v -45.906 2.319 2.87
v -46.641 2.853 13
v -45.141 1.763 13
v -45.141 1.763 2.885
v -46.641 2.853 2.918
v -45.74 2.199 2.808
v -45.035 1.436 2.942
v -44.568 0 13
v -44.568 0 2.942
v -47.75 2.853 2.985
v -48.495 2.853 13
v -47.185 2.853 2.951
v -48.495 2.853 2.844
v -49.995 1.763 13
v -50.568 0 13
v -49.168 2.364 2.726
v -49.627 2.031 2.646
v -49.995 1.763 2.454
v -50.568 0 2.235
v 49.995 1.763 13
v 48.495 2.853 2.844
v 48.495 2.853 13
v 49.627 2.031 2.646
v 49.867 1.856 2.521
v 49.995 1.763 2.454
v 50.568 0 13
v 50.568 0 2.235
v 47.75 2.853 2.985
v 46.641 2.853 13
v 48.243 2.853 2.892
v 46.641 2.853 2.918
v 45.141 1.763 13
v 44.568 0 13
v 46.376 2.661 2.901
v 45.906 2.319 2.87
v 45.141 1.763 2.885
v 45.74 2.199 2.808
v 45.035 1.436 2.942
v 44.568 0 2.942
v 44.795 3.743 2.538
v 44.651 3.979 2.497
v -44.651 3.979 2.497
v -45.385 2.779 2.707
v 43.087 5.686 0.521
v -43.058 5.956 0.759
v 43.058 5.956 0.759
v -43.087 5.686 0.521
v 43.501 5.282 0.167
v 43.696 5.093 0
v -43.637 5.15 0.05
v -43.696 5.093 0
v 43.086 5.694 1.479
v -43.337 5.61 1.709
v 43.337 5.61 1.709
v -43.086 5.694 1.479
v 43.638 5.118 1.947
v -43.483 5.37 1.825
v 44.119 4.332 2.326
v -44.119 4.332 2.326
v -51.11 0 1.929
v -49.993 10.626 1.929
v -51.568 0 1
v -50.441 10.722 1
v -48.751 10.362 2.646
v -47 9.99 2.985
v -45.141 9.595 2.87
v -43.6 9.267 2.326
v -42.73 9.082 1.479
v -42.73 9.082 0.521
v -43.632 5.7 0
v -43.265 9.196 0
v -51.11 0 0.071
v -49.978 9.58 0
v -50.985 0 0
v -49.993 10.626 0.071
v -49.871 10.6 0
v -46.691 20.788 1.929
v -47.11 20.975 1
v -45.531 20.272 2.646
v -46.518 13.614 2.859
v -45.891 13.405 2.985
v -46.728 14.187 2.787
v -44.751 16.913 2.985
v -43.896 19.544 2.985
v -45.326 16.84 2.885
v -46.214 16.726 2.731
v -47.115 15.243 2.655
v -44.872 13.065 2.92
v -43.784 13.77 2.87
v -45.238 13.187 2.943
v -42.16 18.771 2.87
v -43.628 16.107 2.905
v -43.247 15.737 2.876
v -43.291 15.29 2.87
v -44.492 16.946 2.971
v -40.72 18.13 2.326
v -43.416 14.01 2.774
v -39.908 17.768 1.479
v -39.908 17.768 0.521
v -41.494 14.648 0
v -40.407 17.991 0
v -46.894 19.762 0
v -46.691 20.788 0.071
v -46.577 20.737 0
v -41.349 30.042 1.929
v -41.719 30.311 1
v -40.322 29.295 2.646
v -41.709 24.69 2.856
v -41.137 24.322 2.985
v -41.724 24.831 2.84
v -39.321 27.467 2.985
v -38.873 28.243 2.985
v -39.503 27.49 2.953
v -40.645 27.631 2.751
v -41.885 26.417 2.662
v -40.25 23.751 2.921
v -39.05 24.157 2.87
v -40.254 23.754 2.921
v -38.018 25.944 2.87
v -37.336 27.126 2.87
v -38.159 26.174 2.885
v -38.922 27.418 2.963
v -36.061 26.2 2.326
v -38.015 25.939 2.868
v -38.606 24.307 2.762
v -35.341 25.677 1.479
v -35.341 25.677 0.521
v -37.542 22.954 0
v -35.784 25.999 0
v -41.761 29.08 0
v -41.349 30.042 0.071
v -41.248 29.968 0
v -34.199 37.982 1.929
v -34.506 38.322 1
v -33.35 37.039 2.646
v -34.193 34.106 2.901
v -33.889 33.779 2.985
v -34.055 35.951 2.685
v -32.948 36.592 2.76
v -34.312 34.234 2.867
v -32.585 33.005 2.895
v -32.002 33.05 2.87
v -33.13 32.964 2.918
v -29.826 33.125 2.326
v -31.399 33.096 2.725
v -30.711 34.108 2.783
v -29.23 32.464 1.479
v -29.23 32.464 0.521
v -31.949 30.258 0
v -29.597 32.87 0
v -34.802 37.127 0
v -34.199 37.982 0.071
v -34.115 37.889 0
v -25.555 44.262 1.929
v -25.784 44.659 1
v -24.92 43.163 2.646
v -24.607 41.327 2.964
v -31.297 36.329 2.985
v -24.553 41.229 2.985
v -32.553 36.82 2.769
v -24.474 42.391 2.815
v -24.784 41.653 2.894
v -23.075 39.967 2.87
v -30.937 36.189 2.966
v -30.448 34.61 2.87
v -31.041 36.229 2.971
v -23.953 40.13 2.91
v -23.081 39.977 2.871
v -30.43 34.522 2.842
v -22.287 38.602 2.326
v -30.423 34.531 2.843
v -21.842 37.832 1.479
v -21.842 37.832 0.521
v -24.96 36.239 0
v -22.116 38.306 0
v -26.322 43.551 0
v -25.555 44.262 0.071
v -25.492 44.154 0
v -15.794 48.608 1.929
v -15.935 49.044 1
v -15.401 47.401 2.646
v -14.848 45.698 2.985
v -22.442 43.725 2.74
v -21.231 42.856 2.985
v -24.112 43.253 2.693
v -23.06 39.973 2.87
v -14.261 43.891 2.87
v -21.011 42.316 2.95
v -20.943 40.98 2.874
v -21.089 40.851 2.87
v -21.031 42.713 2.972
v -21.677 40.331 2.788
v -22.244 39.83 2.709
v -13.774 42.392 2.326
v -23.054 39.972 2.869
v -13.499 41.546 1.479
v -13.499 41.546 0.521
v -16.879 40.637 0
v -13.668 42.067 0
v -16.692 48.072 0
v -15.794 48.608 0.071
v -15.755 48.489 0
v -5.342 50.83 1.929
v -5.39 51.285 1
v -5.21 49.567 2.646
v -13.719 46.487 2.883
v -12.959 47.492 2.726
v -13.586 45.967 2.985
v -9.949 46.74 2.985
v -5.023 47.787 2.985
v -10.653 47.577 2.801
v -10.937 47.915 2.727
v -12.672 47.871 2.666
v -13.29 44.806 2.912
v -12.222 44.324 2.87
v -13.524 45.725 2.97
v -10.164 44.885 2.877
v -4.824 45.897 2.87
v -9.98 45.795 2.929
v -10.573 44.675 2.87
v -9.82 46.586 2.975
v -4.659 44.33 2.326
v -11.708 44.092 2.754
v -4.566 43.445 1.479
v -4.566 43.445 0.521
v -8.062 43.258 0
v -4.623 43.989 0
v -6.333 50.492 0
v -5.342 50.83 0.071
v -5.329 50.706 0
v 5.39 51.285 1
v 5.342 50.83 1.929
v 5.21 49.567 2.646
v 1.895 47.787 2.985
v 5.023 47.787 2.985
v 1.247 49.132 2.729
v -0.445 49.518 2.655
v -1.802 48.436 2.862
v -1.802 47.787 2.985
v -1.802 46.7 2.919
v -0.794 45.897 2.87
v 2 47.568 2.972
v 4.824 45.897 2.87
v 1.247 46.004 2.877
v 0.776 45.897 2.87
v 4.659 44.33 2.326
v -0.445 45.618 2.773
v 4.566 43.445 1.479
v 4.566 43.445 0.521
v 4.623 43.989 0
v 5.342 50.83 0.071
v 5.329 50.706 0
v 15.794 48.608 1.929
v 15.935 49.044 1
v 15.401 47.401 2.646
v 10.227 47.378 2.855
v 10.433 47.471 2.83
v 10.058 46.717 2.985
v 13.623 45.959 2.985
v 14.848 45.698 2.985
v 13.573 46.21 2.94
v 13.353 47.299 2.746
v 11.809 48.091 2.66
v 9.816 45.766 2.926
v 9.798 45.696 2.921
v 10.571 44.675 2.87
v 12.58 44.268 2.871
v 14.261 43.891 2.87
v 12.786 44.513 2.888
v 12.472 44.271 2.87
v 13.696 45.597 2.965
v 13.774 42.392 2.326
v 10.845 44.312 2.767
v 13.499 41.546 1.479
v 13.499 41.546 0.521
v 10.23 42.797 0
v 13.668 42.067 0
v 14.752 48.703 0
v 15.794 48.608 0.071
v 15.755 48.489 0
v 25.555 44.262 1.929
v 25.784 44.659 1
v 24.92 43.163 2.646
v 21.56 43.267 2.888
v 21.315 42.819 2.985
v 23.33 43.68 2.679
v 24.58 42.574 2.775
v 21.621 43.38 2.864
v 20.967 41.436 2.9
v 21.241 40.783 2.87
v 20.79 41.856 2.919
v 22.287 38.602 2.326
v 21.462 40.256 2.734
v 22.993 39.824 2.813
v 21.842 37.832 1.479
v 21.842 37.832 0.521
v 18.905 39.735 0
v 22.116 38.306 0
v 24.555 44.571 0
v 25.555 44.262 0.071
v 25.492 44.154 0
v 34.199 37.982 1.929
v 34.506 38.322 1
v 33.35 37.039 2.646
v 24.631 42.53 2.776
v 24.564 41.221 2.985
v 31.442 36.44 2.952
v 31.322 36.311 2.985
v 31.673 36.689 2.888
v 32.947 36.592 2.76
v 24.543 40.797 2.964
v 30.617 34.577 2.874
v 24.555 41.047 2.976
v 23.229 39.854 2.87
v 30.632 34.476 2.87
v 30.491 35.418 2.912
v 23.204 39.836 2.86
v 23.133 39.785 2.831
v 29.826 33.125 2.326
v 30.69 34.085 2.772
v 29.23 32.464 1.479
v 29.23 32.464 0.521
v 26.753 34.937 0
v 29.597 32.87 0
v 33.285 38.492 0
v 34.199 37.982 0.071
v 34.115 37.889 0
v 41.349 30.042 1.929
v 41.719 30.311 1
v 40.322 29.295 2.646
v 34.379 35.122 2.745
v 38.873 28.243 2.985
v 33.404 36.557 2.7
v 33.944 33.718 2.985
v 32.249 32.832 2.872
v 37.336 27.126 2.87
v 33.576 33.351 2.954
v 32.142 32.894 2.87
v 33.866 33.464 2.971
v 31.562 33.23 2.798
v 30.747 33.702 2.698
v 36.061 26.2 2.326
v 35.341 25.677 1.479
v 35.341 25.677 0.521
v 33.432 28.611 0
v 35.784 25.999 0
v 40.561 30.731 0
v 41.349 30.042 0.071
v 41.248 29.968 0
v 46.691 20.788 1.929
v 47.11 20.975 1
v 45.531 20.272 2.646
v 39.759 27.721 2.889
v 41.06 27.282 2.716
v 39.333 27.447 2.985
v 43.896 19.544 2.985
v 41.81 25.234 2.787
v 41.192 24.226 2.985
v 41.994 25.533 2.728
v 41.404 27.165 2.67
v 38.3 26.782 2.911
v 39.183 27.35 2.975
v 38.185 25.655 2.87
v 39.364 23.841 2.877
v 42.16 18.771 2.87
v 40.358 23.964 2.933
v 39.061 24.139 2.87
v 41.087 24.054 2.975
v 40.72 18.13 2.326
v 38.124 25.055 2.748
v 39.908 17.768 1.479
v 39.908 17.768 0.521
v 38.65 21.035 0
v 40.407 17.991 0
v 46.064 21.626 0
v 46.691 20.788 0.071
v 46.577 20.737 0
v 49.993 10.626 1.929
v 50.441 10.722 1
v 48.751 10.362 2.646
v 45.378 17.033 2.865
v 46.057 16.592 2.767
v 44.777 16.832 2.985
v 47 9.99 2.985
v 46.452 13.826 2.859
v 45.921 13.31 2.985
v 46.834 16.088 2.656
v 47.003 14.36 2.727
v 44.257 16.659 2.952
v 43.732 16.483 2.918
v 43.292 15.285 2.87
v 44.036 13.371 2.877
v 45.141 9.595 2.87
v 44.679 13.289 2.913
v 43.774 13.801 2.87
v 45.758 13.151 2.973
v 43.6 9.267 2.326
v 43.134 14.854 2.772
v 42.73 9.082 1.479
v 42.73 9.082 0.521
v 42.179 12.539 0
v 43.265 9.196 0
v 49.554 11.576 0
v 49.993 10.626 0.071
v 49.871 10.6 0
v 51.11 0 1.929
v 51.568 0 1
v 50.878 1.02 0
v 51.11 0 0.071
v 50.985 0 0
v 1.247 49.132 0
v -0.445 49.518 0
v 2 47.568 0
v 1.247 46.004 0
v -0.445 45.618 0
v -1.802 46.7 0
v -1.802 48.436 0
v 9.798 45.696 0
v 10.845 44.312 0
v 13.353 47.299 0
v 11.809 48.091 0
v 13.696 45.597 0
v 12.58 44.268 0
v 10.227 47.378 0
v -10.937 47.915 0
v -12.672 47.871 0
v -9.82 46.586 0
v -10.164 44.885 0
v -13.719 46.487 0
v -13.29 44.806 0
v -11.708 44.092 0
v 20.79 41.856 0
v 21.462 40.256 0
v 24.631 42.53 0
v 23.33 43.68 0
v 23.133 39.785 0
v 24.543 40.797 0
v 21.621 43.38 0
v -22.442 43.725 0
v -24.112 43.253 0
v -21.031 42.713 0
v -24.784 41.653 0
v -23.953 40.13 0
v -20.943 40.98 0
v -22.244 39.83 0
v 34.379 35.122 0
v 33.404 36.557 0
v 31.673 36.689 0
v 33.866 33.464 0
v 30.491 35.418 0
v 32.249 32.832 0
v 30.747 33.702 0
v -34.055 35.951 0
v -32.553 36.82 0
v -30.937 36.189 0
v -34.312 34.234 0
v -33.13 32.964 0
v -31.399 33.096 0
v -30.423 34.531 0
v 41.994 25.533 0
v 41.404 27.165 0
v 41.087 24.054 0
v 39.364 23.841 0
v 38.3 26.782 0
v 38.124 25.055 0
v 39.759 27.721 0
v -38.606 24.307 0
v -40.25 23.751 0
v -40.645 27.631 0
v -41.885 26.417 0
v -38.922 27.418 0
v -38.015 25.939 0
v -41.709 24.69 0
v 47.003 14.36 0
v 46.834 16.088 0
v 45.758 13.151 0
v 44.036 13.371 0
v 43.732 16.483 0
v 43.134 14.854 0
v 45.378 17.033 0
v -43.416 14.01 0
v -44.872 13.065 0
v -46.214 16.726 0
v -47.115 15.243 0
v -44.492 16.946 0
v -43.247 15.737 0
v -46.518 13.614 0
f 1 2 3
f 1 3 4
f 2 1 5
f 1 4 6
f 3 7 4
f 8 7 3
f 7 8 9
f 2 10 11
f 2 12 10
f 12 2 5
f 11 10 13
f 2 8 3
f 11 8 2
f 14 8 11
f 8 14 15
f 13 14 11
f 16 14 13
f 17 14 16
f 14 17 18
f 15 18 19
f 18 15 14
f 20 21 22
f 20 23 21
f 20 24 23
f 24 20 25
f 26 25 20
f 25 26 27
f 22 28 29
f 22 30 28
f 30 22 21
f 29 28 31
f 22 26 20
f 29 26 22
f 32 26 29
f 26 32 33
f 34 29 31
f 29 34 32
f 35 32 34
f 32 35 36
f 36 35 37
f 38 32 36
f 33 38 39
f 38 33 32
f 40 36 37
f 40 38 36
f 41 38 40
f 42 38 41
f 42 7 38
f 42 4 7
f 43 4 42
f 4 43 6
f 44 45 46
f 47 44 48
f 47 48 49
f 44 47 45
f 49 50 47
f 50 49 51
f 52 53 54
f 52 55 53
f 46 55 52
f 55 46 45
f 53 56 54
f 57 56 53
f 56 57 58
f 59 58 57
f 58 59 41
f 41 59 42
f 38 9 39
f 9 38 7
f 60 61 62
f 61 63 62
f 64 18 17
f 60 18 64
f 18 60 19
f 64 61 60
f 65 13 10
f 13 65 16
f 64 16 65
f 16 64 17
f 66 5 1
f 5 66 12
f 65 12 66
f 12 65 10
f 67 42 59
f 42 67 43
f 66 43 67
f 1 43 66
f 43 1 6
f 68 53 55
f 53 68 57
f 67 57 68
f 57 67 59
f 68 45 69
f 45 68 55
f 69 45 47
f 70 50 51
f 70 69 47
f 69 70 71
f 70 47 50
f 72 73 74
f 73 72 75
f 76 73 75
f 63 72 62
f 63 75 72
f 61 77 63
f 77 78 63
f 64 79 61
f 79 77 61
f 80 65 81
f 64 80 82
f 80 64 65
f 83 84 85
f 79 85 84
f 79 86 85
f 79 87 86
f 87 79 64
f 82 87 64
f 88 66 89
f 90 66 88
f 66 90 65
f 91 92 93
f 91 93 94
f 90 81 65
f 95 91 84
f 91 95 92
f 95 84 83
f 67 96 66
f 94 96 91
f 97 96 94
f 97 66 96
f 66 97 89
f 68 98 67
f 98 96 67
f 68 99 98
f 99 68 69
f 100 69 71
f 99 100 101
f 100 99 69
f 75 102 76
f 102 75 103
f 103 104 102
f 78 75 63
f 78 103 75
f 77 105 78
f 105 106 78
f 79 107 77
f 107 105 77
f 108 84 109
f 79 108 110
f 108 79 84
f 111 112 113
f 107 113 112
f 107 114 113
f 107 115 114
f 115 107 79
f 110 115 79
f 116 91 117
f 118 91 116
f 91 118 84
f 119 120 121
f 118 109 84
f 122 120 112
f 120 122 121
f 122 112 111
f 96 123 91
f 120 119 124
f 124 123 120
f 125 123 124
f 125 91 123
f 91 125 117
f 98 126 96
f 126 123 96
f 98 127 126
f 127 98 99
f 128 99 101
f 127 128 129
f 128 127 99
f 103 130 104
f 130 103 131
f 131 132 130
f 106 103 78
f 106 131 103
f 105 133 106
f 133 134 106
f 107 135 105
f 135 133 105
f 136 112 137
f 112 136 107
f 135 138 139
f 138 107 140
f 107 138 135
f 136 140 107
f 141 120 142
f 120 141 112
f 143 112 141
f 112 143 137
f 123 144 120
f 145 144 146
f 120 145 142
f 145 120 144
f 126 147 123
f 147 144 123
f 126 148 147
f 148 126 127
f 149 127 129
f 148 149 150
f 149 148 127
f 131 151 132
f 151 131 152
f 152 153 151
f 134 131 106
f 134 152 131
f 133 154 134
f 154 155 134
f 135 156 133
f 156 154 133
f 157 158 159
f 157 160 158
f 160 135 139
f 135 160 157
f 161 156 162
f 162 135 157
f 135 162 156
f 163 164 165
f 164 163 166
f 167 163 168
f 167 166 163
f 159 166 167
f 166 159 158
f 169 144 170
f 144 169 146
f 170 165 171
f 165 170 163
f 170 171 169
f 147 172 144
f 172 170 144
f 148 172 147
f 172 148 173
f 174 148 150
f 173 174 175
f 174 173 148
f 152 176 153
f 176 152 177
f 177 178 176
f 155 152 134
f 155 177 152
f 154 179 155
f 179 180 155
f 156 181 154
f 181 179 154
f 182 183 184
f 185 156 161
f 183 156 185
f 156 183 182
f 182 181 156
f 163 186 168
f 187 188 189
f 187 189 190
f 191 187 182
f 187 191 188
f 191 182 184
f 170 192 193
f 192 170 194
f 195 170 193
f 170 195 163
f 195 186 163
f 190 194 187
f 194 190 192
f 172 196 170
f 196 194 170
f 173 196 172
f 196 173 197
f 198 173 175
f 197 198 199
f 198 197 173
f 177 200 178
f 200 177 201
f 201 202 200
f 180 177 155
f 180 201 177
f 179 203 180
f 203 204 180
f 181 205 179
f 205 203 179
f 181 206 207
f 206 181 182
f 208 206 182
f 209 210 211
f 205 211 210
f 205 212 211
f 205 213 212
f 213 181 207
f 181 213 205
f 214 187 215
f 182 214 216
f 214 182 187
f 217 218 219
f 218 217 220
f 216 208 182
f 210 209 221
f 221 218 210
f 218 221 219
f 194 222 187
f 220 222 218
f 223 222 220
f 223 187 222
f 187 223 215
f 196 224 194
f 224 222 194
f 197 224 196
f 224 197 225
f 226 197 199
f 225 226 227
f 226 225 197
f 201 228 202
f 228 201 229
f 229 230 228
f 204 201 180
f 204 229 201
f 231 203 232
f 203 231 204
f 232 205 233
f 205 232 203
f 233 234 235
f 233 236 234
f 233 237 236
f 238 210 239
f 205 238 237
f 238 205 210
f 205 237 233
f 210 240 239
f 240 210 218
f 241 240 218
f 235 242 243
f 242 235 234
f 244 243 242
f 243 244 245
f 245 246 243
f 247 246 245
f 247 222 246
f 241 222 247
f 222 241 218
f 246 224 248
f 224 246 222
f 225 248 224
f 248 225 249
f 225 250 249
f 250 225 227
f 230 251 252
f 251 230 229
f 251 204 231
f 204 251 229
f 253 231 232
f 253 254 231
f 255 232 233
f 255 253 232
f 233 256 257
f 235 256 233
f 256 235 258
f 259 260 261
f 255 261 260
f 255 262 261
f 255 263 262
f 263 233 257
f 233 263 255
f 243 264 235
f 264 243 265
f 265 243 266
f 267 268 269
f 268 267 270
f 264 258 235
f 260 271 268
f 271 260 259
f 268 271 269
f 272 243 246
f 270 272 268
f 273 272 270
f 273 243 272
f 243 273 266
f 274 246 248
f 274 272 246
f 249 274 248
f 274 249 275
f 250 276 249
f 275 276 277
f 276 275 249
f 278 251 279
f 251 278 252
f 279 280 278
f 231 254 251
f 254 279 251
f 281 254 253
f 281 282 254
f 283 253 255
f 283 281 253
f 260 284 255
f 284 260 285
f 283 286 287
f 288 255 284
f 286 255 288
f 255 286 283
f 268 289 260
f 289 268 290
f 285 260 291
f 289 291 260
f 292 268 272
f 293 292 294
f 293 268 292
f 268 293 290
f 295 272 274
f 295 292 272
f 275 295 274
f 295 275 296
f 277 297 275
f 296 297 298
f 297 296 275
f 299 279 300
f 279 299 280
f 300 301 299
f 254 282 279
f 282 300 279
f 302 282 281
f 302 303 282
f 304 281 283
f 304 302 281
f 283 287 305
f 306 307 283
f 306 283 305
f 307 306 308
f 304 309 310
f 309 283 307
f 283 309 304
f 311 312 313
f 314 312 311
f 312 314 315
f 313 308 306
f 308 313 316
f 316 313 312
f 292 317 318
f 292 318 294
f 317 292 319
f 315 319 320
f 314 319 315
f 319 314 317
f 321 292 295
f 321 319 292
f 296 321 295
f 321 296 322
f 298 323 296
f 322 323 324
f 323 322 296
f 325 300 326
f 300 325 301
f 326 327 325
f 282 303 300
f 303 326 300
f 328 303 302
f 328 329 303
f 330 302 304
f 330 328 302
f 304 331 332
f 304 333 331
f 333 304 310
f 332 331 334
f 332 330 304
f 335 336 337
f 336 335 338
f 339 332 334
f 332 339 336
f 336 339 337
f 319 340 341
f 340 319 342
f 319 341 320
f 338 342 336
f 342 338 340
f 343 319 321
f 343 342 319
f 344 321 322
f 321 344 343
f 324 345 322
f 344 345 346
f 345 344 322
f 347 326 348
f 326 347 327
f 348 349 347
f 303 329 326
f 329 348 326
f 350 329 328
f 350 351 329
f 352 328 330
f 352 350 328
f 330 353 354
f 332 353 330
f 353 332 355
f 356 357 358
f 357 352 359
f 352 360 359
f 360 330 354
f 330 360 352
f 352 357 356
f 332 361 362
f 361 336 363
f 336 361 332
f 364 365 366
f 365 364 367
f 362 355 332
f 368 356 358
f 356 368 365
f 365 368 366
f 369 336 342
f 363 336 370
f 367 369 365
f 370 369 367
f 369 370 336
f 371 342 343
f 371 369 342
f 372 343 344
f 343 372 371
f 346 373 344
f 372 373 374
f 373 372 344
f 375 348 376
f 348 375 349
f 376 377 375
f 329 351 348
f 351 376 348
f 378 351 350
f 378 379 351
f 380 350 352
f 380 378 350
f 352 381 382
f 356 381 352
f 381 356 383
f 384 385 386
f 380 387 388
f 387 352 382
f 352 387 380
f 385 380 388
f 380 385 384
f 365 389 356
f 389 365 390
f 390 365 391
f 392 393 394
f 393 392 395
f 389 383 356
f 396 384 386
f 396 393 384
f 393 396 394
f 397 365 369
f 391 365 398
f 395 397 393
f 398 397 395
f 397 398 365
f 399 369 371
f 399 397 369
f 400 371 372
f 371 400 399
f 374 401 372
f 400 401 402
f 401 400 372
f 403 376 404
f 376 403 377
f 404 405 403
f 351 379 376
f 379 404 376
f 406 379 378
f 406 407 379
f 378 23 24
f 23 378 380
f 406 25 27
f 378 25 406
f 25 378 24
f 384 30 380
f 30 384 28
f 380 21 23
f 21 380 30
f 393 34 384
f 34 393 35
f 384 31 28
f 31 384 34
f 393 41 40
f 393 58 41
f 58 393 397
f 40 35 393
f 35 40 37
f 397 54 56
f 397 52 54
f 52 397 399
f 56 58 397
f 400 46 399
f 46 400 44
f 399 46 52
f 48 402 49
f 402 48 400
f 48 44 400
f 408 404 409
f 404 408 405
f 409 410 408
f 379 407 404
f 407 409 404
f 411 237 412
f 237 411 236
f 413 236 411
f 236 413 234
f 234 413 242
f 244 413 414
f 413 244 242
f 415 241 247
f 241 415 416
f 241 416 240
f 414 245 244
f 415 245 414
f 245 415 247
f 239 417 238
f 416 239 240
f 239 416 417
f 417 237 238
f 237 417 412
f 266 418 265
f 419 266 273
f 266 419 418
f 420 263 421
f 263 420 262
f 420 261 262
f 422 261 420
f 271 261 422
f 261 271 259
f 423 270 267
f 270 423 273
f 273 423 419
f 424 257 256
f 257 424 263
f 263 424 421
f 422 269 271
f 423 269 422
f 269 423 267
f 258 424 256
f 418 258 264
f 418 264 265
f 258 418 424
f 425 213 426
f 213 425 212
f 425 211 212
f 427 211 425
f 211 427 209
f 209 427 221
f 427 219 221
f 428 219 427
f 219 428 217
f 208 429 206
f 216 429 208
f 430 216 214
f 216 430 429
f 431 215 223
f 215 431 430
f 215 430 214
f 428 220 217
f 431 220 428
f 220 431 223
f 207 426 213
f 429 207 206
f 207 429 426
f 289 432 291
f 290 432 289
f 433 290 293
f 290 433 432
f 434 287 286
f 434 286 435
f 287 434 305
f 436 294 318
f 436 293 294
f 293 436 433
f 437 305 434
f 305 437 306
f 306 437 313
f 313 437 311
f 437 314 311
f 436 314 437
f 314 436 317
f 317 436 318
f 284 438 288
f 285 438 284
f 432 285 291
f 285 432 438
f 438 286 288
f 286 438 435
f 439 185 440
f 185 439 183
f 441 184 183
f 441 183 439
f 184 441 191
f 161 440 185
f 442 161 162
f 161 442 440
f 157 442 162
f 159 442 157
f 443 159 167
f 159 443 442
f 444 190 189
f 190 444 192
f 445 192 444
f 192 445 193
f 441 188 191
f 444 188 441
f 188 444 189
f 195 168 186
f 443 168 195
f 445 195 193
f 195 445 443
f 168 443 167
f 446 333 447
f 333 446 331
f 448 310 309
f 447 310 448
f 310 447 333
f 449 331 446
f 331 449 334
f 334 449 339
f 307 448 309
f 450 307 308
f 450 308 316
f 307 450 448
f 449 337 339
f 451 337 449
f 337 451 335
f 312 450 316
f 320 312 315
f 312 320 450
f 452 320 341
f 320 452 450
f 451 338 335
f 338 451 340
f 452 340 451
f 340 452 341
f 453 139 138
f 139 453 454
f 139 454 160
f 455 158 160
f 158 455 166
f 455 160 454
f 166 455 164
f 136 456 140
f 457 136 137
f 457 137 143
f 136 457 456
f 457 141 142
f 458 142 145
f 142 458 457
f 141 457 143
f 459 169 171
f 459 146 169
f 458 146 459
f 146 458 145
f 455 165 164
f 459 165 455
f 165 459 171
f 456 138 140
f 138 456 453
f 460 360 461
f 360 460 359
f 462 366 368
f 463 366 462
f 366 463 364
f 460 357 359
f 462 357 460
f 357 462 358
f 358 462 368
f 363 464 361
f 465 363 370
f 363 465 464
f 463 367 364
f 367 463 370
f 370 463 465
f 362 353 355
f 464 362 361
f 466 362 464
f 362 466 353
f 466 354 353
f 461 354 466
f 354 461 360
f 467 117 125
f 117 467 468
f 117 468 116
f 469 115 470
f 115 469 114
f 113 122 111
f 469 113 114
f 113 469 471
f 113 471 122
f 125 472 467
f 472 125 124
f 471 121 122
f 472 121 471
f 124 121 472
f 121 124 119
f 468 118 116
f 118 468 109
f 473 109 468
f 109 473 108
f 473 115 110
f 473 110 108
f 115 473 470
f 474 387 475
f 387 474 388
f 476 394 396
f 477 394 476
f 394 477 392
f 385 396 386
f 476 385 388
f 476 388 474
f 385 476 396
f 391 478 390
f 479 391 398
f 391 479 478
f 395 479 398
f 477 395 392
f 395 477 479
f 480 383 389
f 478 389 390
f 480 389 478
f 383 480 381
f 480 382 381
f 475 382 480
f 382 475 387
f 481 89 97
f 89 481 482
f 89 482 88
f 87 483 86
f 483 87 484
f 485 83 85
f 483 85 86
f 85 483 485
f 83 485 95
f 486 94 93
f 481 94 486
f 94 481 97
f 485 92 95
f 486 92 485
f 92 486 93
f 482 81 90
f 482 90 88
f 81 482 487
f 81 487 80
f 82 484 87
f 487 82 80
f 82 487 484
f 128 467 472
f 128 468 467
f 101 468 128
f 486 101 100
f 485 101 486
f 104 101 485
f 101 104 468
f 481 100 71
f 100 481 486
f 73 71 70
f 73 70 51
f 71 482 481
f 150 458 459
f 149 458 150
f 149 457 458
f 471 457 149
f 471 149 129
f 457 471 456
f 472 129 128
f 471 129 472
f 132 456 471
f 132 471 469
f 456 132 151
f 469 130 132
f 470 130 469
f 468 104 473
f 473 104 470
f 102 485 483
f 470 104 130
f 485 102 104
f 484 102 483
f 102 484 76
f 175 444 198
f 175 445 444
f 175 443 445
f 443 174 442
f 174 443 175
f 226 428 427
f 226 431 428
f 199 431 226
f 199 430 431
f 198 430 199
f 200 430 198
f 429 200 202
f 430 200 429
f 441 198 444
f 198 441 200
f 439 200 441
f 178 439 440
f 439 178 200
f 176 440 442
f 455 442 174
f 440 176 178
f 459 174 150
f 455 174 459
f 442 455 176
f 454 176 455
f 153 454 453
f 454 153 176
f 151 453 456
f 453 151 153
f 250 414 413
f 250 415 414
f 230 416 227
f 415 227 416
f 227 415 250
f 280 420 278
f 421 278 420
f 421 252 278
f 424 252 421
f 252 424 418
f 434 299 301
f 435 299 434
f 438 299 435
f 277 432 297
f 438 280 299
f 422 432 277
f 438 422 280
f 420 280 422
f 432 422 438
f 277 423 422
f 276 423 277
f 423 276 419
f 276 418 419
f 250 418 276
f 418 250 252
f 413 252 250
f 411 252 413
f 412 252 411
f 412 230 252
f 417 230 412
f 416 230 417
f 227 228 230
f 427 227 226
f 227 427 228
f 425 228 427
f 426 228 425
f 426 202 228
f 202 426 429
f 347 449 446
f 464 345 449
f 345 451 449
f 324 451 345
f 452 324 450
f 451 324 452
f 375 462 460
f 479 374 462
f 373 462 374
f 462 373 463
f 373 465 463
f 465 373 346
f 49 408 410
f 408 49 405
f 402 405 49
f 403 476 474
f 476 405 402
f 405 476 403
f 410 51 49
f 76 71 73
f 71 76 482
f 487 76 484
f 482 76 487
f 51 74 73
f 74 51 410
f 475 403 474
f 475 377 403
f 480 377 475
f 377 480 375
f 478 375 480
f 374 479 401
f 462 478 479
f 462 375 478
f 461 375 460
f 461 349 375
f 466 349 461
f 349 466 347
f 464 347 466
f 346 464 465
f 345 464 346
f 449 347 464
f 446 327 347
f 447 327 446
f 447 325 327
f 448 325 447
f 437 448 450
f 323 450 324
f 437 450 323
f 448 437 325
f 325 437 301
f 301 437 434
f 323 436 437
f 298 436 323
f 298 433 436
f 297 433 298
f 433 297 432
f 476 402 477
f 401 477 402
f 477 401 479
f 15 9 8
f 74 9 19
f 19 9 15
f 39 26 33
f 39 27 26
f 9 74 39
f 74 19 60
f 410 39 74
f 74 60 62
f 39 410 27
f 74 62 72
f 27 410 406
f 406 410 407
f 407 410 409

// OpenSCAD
//
//  Copyright (C) 14-04-2012 Jasper den Ouden.
//
//  This is free software: you can redistribute it and/or modify
//  it under the terms of the GNU General Public License as published
//  by the Free Software Foundation, either version 3 of the License, or
//  (at your option) any later version.
//

//Note: only really suitable for mh<t;

cl= 260; //circumference.

pi=3.141592653589793;
r= cl/(2+pi);

echo(2*r);

fd = 25; //Distance between 'feature-adding holes'
fr = 2;

t= 6;   //Thickness of walls.

//Negative radius for no magnets.
mr = -9;   //Radius of embedded magnets.(Get it right!)
mh = t; //.. height

worry_stickiness = true; //Turn this on/off if you worry about the stickiness of
                         // the surface.

//Negative thickness for no clamp.
ct = -15; //clamped thickness. 
cd = 3; //Clamp distance
ch  = 50; //Clamp height.

h = max(2*mr+t/2, 2*t); //Calculated height

inf=2*(h+r);

skimmer=true;

module magnet_hole()
{   rotate([90,0]) translate([0,h/2,-mh]) cylinder(r=mr,h=2*mh); }

module feature_hole()
{
    translate([0,r-t/2]) cylinder(r=fr, h=3*h);
//    translate([0,r-2*t,h+1.2*t]) rotate([-90,0]) 
//        scale([1/8,h/(4*fd)]) cylinder(r=fd, h=3*h);
}

module clamp()
{
    cw = ct+2*t;
    rotate([0,-90]) linear_extrude(height=t)
    {
        difference()
        {   union()
            {   translate([2*t/3,0]) square([ch-1.5*cw-2*t/3,cw]);
                translate([0,t]) square([ch-cw,cw-2*t]);
                translate([2*t/3,t]) circle(t);
                translate([2*t/3,cw-t]) circle(t);
                translate([ch-1.5*cw,cw/2]) scale([2,1]) circle(cw/2);
            }
            translate([-inf,0]) square(2*[inf,inf], center=true);
            translate([0,cw/2]) 
            {   square([2*(ch-2*ct-t/2),ct], center=true);
                translate([ch-2*ct-t/2,0]) scale([1,1/2]) circle(ct);
            }
        }
        translate([2*cd,(cw-ct)/2]) scale([2,1])
        {   circle(cd);
            translate([0,ct]) circle(cd);
        }
    }
    if( worry_stickiness )
    {   translate([-t,2*t/3]) scale([3,1]) cylinder(r1=(2*t/3),r2=0,h=t); }
}

module bag_holder()
{

//2*r^2 *(1-cos(da)) = fd^2
// 1-cos(da) = (fd/r)^2/2
    da = acos(1-fd*fd/(2*r*r));
    intersection()
    {   difference()
        {   translate([0,0,t/6]) union()
            {   if( mr>0 )
                {   rotate([-90,0]) translate([0,t/3-h/2]) cylinder(r=mr+t/2,h=t);
                    translate([0,t/2,h/2-t/3])
                    {   rotate([0,-45]) translate([mr,0,-sqrt(2)*h]) 
                            cylinder(r=t/2,h=sqrt(2)*h);
                        rotate([0,225]) translate([mr,0])
                            cylinder(r=t/2,h=sqrt(2)*h);
                    }
                }
                if( mr<0 && ct<0 )
                {   translate([t/2-r,0]) cylinder(r=t/2,h=2*t);
                    translate([r-t/2,0]) cylinder(r=t/2,h=2*t);
                }
                
                scale([1,1,1/2])
                {   translate([t/2-r,0]) rotate([0,90])  
                        scale([1,3/2]) cylinder(r=2*t/3,h=2*r-t);
                    rotate_extrude() translate([r-t/2,0]) circle(2*t/3);
                }
            }
            if( mr>0 )
            {   magnet_hole(mr=mr,mh=mh,h=h); }
            if( fr>0 ) translate([0,0,-h]) for( a=[0 : da/2 : 80] )
            {   rotate(-a) feature_hole();
                rotate(+a) feature_hole();
            }
        }
        translate([0,inf,inf]) cube(2*[inf,inf,inf], center=true);
    }

    cw = ct+2*t;
    if( ct>0 )
    {
        translate([r,-cw+t]) clamp(ct=ct,t=t,r=r,h=h,cd=cd);
        scale([-1,1]) translate([r,-cw+t]) clamp(ct=ct,t=t,r=r,h=h,cd=cd);
    }
}

bag_holder();
